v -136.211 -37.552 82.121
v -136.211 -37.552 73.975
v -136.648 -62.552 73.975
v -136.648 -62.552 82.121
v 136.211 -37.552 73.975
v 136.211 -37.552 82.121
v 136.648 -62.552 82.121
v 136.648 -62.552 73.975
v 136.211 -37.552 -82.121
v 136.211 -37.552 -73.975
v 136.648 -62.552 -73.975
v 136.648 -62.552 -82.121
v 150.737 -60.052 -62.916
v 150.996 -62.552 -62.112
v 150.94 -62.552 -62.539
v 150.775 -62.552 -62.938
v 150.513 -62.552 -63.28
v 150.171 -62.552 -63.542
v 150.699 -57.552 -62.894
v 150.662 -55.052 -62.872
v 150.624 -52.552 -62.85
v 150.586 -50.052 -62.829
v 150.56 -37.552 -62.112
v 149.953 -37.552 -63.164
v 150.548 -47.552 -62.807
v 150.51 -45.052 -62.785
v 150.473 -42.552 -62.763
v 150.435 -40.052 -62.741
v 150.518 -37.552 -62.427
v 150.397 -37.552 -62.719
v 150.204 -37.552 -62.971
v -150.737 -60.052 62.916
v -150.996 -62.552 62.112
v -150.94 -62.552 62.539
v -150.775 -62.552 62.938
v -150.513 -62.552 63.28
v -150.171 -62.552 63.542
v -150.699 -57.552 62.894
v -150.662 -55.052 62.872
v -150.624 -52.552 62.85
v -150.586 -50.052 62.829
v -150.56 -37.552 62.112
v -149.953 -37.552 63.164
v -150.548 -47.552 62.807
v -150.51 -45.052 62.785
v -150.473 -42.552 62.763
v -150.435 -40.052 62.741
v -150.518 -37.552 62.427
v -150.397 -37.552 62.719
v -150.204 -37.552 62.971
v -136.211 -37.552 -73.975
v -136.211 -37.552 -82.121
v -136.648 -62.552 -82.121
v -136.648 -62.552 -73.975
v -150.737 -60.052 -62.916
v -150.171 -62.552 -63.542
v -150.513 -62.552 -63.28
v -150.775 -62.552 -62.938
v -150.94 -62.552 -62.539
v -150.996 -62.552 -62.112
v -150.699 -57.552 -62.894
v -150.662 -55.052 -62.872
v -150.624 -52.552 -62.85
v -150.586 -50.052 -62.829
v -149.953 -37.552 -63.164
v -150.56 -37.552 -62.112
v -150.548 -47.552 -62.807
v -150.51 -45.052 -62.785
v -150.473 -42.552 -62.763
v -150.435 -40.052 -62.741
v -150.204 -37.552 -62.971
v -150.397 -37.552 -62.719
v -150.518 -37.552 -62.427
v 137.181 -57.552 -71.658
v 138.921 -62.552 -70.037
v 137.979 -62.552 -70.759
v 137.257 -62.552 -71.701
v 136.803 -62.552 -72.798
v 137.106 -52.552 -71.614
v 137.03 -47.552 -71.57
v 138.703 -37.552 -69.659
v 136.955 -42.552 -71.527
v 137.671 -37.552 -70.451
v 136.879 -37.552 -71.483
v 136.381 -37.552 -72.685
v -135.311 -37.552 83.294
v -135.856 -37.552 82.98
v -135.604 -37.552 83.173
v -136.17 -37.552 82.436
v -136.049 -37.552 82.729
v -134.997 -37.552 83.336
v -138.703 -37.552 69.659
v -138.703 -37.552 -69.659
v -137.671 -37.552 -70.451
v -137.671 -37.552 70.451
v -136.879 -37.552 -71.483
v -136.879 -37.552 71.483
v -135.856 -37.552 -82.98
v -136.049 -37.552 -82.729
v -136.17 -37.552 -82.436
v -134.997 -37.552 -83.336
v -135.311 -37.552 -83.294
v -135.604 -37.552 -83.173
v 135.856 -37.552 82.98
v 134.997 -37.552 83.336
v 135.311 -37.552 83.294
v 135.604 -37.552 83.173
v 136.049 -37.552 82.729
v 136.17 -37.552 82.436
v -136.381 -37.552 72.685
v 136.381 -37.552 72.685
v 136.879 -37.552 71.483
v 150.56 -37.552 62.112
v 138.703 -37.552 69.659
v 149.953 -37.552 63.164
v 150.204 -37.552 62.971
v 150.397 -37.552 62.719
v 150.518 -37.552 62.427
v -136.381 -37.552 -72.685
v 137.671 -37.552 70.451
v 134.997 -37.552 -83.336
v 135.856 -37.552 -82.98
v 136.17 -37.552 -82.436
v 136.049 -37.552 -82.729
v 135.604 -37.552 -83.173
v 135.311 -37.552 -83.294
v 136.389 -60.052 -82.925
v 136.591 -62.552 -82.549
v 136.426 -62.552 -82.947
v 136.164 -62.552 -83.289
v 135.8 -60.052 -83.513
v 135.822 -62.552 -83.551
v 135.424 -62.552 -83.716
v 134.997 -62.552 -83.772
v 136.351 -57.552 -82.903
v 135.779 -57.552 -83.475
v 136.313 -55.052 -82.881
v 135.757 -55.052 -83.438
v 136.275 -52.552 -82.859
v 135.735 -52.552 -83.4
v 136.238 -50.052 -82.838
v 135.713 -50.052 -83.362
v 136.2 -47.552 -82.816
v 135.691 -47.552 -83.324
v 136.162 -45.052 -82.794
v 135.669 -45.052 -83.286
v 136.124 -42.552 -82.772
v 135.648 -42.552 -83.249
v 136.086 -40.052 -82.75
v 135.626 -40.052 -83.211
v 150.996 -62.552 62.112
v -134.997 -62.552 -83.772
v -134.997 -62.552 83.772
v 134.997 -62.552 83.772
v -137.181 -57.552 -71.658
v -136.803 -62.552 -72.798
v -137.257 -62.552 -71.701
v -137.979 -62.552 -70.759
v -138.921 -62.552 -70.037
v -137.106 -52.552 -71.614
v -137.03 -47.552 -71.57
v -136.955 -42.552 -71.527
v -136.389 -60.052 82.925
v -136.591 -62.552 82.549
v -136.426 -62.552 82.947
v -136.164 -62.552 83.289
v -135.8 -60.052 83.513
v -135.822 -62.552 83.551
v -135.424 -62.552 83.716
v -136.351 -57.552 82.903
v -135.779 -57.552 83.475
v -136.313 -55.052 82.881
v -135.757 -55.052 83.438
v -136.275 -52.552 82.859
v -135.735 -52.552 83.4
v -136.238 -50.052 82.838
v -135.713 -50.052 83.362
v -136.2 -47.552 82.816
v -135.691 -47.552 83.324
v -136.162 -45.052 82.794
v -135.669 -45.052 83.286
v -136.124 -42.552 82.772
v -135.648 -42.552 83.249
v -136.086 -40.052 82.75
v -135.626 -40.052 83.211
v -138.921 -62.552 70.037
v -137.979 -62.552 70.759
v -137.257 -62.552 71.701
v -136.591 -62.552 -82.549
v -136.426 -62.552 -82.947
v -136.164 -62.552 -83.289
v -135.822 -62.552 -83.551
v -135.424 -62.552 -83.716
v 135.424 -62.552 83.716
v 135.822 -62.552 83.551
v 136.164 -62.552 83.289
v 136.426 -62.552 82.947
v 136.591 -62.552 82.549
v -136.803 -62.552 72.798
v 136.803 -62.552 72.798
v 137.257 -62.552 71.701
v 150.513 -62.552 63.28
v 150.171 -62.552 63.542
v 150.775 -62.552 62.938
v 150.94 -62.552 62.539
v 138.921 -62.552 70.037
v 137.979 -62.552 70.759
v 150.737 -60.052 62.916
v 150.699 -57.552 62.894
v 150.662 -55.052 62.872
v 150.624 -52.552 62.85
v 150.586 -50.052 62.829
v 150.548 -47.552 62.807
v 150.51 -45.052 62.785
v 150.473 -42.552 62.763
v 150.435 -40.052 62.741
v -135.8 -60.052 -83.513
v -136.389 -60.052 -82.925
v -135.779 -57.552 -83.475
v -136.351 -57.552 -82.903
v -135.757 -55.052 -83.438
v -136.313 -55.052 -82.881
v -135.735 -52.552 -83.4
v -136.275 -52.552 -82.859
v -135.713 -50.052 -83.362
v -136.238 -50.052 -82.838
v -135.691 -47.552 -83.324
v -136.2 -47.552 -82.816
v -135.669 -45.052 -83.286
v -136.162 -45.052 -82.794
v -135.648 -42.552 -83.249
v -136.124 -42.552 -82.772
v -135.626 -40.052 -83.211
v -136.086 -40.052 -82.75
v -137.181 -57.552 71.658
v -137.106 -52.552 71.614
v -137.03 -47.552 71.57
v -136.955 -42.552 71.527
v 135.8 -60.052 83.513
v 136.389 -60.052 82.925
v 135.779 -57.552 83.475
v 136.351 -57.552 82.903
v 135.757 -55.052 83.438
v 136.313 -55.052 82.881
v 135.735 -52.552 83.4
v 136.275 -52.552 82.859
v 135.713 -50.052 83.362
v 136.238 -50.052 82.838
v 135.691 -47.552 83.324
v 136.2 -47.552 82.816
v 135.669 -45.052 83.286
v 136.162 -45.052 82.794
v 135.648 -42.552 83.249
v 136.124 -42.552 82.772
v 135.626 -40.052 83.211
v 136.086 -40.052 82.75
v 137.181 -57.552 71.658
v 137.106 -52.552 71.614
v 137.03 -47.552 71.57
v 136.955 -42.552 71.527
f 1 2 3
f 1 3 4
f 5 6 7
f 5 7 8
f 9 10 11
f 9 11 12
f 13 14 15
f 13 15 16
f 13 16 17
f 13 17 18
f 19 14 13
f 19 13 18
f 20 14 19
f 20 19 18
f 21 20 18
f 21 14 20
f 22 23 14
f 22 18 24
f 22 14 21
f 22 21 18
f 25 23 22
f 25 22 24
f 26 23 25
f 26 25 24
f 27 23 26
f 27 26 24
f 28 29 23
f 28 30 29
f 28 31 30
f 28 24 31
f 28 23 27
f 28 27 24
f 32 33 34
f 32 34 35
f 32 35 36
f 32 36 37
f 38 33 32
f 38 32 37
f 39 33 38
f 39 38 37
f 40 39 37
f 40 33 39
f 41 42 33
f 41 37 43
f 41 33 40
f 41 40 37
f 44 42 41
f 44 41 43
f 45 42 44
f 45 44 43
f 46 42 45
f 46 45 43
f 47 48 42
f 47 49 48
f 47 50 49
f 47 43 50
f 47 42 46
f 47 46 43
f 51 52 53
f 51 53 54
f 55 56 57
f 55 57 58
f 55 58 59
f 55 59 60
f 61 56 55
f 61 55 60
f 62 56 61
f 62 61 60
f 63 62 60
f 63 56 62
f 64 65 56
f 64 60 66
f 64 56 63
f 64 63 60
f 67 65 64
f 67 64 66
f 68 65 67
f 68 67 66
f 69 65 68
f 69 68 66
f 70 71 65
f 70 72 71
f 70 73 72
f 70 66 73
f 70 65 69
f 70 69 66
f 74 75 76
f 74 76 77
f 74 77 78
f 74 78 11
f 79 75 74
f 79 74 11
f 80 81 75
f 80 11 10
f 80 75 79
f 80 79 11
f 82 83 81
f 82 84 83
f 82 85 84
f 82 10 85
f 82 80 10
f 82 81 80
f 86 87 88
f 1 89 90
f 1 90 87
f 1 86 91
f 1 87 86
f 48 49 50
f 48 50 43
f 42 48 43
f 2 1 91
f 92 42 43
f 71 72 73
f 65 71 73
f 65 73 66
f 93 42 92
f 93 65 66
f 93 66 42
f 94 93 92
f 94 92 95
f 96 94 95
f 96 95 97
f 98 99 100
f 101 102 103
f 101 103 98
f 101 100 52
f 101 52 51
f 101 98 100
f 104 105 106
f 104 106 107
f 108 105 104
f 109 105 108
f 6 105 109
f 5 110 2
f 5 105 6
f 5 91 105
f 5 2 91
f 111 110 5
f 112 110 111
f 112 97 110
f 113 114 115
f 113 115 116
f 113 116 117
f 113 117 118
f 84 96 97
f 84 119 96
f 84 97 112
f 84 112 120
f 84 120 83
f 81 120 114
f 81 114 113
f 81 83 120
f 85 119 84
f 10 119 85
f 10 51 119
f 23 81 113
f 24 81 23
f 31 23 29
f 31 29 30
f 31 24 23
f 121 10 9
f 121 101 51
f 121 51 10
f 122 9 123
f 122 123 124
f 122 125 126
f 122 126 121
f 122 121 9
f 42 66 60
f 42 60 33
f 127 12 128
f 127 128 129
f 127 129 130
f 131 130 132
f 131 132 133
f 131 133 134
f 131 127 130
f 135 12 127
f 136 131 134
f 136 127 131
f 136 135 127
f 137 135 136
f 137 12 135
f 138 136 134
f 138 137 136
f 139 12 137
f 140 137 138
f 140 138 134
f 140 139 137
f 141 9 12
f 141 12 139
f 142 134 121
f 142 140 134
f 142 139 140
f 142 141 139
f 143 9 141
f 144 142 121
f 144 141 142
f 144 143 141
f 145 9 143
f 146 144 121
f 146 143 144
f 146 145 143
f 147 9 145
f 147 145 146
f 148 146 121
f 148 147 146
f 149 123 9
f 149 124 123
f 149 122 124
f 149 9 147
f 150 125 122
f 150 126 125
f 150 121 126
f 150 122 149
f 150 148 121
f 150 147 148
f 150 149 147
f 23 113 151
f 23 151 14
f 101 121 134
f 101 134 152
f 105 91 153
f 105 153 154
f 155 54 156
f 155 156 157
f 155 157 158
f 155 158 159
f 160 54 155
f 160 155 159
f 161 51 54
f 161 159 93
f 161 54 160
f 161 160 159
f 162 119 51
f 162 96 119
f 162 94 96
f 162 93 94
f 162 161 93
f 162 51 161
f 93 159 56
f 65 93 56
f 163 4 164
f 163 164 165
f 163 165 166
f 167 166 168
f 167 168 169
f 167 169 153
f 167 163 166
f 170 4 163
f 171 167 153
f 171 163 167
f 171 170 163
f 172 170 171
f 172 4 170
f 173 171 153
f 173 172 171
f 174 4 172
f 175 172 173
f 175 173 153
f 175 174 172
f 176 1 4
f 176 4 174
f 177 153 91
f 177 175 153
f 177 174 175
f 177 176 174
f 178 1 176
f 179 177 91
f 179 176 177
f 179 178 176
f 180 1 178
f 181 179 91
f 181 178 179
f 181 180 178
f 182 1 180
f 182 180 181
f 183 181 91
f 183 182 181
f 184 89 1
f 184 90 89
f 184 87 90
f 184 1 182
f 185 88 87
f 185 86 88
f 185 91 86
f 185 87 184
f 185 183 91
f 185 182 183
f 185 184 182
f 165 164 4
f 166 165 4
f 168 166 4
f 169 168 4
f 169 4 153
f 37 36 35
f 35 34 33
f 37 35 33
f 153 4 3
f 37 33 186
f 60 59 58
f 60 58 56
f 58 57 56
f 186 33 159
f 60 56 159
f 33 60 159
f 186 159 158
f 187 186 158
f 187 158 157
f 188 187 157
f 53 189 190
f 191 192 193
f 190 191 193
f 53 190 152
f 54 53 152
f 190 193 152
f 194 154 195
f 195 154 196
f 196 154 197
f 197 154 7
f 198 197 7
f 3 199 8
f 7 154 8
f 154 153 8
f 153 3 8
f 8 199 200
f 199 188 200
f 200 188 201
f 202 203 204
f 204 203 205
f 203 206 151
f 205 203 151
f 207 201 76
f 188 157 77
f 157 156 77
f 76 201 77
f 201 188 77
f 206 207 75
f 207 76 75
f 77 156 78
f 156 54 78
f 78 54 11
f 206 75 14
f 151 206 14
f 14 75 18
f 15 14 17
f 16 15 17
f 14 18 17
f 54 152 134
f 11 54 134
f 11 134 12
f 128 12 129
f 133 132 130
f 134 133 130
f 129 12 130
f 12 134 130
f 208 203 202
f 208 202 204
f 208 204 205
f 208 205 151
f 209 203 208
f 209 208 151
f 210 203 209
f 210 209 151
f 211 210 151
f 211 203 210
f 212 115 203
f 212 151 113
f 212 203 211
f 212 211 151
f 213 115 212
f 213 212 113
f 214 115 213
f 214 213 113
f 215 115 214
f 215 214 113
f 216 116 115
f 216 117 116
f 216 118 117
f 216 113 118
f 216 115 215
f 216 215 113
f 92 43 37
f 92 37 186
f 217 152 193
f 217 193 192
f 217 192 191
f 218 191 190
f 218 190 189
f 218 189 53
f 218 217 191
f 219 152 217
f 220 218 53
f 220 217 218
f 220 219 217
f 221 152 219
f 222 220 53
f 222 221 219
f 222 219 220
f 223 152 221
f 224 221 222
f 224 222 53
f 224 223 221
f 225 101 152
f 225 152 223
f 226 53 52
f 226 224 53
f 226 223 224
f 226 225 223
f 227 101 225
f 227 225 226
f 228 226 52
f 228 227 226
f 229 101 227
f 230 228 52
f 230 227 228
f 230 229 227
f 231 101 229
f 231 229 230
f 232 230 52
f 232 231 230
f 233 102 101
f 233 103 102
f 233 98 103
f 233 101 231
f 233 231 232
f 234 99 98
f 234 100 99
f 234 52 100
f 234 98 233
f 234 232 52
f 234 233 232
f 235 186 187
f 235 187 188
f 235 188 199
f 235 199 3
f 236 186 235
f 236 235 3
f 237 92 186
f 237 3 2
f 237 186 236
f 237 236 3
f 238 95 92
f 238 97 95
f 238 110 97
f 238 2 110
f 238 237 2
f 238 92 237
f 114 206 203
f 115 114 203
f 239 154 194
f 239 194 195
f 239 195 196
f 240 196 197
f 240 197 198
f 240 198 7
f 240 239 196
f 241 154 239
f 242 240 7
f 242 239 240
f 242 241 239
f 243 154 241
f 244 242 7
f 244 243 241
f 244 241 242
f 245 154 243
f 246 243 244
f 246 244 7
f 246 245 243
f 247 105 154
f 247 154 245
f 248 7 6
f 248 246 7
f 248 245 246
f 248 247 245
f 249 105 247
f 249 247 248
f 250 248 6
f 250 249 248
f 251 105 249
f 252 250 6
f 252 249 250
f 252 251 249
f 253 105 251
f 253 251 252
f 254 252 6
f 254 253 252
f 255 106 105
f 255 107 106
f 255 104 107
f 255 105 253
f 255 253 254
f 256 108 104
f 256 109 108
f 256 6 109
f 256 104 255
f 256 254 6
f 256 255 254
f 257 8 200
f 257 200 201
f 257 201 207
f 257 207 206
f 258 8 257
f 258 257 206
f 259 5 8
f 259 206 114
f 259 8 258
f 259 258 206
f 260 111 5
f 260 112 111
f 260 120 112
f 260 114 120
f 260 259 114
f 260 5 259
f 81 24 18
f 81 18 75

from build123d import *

# Parameters (mm, degrees)
BOSS_EXTRUDE1_DEPTH = 25
BOSS_EXTRUDE1_DRAFT = 1


with BuildPart() as part:
    # Sketch1 → Boss-Extrude1 (with draft: the straight prism first)
    with BuildSketch(Plane(origin=(0, -37.552068535, 0), x_dir=(1, 0, 0), z_dir=(0, 1, 0))):
        with BuildLine():
            ThreePointArc((150.559794425, 62.112181192), (150.39707932, 62.719442231), (149.952533386, 63.163988165))
            Line((149.952533386, 63.163988165), (138.703010202, 69.658903404))
            ThreePointArc((138.703010202, 69.658903404), (136.878930836, 71.482982769), (136.21127145, 73.97472152))
            Line((136.21127145, 73.97472152), (136.21127145, 82.121264476))
            ThreePointArc((136.21127145, 82.121264476), (135.855546169, 82.980061273), (134.996749372, 83.335786554))
            Line((134.996749372, 83.335786554), (-134.996749372, 83.335786554))
            ThreePointArc((-134.996749372, 83.335786554), (-135.855546169, 82.980061273), (-136.21127145, 82.121264476))
            Line((-136.21127145, 82.121264476), (-136.21127145, 73.97472152))
            ThreePointArc((-136.21127145, 73.97472152), (-136.878930836, 71.482982769), (-138.703010202, 69.658903404))
            Line((-138.703010202, 69.658903404), (-149.952533386, 63.163988165))
            ThreePointArc((-149.952533386, 63.163988165), (-150.39707932, 62.719442231), (-150.559794425, 62.112181192))
            Line((-150.559794425, 62.112181192), (-150.559794425, -62.112181192))
            ThreePointArc((-150.559794425, -62.112181192), (-150.39707932, -62.719442231), (-149.952533386, -63.163988165))
            Line((-149.952533386, -63.163988165), (-138.703010202, -69.658903404))
            ThreePointArc((-138.703010202, -69.658903404), (-136.878930836, -71.482982769), (-136.21127145, -73.97472152))
            Line((-136.21127145, -73.97472152), (-136.21127145, -82.121264476))
            ThreePointArc((-136.21127145, -82.121264476), (-135.855546169, -82.980061273), (-134.996749372, -83.335786554))
            Line((-134.996749372, -83.335786554), (134.996749372, -83.335786554))
            ThreePointArc((134.996749372, -83.335786554), (135.855546169, -82.980061273), (136.21127145, -82.121264476))
            Line((136.21127145, -82.121264476), (136.21127145, -73.97472152))
            ThreePointArc((136.21127145, -73.97472152), (136.878930836, -71.482982769), (138.703010202, -69.658903404))
            Line((138.703010202, -69.658903404), (149.952533386, -63.163988165))
            ThreePointArc((149.952533386, -63.163988165), (150.39707932, -62.719442231), (150.559794425, -62.112181192))
            Line((150.559794425, -62.112181192), (150.559794425, 62.112181192))
        make_face()
    extrude(amount=-BOSS_EXTRUDE1_DEPTH)
    # Boss-Extrude1: the draft: its side faces are tilted about the plane it starts from
    boss_extrude1_sides = [part.faces().sort_by_distance(p)[0] for p in [
        (150.39707932, -50.052068535, -62.719442231),
        (144.327771794, -50.052068535, -66.411445784),
        (136.878930836, -50.052068535, -71.482982769),
        (136.21127145, -50.052068535, -78.047992998),
        (135.855546169, -50.052068535, -82.980061273),
        (0, -50.052068535, -83.335786554),
        (-135.855546169, -50.052068535, -82.980061273),
        (-136.21127145, -50.052068535, -78.047992998),
        (-136.878930836, -50.052068535, -71.482982769),
        (-144.327771794, -50.052068535, -66.411445784),
        (-150.39707932, -50.052068535, -62.719442231),
        (-150.559794425, -50.052068535, 0),
        (-150.39707932, -50.052068535, 62.719442231),
        (-144.327771794, -50.052068535, 66.411445784),
        (-136.878930836, -50.052068535, 71.482982769),
        (-136.21127145, -50.052068535, 78.047992998),
        (-135.855546169, -50.052068535, 82.980061273),
        (0, -50.052068535, 83.335786554),
        (135.855546169, -50.052068535, 82.980061273),
        (136.21127145, -50.052068535, 78.047992998),
        (136.878930836, -50.052068535, 71.482982769),
        (144.327771794, -50.052068535, 66.411445784),
        (150.39707932, -50.052068535, 62.719442231),
        (150.559794425, -50.052068535, 0),
    ]]
    draft(boss_extrude1_sides, Plane(origin=(0, -37.552068535, 0), x_dir=(1, 0, 0), z_dir=(0, 1, 0)), BOSS_EXTRUDE1_DRAFT)


solid = part.part
